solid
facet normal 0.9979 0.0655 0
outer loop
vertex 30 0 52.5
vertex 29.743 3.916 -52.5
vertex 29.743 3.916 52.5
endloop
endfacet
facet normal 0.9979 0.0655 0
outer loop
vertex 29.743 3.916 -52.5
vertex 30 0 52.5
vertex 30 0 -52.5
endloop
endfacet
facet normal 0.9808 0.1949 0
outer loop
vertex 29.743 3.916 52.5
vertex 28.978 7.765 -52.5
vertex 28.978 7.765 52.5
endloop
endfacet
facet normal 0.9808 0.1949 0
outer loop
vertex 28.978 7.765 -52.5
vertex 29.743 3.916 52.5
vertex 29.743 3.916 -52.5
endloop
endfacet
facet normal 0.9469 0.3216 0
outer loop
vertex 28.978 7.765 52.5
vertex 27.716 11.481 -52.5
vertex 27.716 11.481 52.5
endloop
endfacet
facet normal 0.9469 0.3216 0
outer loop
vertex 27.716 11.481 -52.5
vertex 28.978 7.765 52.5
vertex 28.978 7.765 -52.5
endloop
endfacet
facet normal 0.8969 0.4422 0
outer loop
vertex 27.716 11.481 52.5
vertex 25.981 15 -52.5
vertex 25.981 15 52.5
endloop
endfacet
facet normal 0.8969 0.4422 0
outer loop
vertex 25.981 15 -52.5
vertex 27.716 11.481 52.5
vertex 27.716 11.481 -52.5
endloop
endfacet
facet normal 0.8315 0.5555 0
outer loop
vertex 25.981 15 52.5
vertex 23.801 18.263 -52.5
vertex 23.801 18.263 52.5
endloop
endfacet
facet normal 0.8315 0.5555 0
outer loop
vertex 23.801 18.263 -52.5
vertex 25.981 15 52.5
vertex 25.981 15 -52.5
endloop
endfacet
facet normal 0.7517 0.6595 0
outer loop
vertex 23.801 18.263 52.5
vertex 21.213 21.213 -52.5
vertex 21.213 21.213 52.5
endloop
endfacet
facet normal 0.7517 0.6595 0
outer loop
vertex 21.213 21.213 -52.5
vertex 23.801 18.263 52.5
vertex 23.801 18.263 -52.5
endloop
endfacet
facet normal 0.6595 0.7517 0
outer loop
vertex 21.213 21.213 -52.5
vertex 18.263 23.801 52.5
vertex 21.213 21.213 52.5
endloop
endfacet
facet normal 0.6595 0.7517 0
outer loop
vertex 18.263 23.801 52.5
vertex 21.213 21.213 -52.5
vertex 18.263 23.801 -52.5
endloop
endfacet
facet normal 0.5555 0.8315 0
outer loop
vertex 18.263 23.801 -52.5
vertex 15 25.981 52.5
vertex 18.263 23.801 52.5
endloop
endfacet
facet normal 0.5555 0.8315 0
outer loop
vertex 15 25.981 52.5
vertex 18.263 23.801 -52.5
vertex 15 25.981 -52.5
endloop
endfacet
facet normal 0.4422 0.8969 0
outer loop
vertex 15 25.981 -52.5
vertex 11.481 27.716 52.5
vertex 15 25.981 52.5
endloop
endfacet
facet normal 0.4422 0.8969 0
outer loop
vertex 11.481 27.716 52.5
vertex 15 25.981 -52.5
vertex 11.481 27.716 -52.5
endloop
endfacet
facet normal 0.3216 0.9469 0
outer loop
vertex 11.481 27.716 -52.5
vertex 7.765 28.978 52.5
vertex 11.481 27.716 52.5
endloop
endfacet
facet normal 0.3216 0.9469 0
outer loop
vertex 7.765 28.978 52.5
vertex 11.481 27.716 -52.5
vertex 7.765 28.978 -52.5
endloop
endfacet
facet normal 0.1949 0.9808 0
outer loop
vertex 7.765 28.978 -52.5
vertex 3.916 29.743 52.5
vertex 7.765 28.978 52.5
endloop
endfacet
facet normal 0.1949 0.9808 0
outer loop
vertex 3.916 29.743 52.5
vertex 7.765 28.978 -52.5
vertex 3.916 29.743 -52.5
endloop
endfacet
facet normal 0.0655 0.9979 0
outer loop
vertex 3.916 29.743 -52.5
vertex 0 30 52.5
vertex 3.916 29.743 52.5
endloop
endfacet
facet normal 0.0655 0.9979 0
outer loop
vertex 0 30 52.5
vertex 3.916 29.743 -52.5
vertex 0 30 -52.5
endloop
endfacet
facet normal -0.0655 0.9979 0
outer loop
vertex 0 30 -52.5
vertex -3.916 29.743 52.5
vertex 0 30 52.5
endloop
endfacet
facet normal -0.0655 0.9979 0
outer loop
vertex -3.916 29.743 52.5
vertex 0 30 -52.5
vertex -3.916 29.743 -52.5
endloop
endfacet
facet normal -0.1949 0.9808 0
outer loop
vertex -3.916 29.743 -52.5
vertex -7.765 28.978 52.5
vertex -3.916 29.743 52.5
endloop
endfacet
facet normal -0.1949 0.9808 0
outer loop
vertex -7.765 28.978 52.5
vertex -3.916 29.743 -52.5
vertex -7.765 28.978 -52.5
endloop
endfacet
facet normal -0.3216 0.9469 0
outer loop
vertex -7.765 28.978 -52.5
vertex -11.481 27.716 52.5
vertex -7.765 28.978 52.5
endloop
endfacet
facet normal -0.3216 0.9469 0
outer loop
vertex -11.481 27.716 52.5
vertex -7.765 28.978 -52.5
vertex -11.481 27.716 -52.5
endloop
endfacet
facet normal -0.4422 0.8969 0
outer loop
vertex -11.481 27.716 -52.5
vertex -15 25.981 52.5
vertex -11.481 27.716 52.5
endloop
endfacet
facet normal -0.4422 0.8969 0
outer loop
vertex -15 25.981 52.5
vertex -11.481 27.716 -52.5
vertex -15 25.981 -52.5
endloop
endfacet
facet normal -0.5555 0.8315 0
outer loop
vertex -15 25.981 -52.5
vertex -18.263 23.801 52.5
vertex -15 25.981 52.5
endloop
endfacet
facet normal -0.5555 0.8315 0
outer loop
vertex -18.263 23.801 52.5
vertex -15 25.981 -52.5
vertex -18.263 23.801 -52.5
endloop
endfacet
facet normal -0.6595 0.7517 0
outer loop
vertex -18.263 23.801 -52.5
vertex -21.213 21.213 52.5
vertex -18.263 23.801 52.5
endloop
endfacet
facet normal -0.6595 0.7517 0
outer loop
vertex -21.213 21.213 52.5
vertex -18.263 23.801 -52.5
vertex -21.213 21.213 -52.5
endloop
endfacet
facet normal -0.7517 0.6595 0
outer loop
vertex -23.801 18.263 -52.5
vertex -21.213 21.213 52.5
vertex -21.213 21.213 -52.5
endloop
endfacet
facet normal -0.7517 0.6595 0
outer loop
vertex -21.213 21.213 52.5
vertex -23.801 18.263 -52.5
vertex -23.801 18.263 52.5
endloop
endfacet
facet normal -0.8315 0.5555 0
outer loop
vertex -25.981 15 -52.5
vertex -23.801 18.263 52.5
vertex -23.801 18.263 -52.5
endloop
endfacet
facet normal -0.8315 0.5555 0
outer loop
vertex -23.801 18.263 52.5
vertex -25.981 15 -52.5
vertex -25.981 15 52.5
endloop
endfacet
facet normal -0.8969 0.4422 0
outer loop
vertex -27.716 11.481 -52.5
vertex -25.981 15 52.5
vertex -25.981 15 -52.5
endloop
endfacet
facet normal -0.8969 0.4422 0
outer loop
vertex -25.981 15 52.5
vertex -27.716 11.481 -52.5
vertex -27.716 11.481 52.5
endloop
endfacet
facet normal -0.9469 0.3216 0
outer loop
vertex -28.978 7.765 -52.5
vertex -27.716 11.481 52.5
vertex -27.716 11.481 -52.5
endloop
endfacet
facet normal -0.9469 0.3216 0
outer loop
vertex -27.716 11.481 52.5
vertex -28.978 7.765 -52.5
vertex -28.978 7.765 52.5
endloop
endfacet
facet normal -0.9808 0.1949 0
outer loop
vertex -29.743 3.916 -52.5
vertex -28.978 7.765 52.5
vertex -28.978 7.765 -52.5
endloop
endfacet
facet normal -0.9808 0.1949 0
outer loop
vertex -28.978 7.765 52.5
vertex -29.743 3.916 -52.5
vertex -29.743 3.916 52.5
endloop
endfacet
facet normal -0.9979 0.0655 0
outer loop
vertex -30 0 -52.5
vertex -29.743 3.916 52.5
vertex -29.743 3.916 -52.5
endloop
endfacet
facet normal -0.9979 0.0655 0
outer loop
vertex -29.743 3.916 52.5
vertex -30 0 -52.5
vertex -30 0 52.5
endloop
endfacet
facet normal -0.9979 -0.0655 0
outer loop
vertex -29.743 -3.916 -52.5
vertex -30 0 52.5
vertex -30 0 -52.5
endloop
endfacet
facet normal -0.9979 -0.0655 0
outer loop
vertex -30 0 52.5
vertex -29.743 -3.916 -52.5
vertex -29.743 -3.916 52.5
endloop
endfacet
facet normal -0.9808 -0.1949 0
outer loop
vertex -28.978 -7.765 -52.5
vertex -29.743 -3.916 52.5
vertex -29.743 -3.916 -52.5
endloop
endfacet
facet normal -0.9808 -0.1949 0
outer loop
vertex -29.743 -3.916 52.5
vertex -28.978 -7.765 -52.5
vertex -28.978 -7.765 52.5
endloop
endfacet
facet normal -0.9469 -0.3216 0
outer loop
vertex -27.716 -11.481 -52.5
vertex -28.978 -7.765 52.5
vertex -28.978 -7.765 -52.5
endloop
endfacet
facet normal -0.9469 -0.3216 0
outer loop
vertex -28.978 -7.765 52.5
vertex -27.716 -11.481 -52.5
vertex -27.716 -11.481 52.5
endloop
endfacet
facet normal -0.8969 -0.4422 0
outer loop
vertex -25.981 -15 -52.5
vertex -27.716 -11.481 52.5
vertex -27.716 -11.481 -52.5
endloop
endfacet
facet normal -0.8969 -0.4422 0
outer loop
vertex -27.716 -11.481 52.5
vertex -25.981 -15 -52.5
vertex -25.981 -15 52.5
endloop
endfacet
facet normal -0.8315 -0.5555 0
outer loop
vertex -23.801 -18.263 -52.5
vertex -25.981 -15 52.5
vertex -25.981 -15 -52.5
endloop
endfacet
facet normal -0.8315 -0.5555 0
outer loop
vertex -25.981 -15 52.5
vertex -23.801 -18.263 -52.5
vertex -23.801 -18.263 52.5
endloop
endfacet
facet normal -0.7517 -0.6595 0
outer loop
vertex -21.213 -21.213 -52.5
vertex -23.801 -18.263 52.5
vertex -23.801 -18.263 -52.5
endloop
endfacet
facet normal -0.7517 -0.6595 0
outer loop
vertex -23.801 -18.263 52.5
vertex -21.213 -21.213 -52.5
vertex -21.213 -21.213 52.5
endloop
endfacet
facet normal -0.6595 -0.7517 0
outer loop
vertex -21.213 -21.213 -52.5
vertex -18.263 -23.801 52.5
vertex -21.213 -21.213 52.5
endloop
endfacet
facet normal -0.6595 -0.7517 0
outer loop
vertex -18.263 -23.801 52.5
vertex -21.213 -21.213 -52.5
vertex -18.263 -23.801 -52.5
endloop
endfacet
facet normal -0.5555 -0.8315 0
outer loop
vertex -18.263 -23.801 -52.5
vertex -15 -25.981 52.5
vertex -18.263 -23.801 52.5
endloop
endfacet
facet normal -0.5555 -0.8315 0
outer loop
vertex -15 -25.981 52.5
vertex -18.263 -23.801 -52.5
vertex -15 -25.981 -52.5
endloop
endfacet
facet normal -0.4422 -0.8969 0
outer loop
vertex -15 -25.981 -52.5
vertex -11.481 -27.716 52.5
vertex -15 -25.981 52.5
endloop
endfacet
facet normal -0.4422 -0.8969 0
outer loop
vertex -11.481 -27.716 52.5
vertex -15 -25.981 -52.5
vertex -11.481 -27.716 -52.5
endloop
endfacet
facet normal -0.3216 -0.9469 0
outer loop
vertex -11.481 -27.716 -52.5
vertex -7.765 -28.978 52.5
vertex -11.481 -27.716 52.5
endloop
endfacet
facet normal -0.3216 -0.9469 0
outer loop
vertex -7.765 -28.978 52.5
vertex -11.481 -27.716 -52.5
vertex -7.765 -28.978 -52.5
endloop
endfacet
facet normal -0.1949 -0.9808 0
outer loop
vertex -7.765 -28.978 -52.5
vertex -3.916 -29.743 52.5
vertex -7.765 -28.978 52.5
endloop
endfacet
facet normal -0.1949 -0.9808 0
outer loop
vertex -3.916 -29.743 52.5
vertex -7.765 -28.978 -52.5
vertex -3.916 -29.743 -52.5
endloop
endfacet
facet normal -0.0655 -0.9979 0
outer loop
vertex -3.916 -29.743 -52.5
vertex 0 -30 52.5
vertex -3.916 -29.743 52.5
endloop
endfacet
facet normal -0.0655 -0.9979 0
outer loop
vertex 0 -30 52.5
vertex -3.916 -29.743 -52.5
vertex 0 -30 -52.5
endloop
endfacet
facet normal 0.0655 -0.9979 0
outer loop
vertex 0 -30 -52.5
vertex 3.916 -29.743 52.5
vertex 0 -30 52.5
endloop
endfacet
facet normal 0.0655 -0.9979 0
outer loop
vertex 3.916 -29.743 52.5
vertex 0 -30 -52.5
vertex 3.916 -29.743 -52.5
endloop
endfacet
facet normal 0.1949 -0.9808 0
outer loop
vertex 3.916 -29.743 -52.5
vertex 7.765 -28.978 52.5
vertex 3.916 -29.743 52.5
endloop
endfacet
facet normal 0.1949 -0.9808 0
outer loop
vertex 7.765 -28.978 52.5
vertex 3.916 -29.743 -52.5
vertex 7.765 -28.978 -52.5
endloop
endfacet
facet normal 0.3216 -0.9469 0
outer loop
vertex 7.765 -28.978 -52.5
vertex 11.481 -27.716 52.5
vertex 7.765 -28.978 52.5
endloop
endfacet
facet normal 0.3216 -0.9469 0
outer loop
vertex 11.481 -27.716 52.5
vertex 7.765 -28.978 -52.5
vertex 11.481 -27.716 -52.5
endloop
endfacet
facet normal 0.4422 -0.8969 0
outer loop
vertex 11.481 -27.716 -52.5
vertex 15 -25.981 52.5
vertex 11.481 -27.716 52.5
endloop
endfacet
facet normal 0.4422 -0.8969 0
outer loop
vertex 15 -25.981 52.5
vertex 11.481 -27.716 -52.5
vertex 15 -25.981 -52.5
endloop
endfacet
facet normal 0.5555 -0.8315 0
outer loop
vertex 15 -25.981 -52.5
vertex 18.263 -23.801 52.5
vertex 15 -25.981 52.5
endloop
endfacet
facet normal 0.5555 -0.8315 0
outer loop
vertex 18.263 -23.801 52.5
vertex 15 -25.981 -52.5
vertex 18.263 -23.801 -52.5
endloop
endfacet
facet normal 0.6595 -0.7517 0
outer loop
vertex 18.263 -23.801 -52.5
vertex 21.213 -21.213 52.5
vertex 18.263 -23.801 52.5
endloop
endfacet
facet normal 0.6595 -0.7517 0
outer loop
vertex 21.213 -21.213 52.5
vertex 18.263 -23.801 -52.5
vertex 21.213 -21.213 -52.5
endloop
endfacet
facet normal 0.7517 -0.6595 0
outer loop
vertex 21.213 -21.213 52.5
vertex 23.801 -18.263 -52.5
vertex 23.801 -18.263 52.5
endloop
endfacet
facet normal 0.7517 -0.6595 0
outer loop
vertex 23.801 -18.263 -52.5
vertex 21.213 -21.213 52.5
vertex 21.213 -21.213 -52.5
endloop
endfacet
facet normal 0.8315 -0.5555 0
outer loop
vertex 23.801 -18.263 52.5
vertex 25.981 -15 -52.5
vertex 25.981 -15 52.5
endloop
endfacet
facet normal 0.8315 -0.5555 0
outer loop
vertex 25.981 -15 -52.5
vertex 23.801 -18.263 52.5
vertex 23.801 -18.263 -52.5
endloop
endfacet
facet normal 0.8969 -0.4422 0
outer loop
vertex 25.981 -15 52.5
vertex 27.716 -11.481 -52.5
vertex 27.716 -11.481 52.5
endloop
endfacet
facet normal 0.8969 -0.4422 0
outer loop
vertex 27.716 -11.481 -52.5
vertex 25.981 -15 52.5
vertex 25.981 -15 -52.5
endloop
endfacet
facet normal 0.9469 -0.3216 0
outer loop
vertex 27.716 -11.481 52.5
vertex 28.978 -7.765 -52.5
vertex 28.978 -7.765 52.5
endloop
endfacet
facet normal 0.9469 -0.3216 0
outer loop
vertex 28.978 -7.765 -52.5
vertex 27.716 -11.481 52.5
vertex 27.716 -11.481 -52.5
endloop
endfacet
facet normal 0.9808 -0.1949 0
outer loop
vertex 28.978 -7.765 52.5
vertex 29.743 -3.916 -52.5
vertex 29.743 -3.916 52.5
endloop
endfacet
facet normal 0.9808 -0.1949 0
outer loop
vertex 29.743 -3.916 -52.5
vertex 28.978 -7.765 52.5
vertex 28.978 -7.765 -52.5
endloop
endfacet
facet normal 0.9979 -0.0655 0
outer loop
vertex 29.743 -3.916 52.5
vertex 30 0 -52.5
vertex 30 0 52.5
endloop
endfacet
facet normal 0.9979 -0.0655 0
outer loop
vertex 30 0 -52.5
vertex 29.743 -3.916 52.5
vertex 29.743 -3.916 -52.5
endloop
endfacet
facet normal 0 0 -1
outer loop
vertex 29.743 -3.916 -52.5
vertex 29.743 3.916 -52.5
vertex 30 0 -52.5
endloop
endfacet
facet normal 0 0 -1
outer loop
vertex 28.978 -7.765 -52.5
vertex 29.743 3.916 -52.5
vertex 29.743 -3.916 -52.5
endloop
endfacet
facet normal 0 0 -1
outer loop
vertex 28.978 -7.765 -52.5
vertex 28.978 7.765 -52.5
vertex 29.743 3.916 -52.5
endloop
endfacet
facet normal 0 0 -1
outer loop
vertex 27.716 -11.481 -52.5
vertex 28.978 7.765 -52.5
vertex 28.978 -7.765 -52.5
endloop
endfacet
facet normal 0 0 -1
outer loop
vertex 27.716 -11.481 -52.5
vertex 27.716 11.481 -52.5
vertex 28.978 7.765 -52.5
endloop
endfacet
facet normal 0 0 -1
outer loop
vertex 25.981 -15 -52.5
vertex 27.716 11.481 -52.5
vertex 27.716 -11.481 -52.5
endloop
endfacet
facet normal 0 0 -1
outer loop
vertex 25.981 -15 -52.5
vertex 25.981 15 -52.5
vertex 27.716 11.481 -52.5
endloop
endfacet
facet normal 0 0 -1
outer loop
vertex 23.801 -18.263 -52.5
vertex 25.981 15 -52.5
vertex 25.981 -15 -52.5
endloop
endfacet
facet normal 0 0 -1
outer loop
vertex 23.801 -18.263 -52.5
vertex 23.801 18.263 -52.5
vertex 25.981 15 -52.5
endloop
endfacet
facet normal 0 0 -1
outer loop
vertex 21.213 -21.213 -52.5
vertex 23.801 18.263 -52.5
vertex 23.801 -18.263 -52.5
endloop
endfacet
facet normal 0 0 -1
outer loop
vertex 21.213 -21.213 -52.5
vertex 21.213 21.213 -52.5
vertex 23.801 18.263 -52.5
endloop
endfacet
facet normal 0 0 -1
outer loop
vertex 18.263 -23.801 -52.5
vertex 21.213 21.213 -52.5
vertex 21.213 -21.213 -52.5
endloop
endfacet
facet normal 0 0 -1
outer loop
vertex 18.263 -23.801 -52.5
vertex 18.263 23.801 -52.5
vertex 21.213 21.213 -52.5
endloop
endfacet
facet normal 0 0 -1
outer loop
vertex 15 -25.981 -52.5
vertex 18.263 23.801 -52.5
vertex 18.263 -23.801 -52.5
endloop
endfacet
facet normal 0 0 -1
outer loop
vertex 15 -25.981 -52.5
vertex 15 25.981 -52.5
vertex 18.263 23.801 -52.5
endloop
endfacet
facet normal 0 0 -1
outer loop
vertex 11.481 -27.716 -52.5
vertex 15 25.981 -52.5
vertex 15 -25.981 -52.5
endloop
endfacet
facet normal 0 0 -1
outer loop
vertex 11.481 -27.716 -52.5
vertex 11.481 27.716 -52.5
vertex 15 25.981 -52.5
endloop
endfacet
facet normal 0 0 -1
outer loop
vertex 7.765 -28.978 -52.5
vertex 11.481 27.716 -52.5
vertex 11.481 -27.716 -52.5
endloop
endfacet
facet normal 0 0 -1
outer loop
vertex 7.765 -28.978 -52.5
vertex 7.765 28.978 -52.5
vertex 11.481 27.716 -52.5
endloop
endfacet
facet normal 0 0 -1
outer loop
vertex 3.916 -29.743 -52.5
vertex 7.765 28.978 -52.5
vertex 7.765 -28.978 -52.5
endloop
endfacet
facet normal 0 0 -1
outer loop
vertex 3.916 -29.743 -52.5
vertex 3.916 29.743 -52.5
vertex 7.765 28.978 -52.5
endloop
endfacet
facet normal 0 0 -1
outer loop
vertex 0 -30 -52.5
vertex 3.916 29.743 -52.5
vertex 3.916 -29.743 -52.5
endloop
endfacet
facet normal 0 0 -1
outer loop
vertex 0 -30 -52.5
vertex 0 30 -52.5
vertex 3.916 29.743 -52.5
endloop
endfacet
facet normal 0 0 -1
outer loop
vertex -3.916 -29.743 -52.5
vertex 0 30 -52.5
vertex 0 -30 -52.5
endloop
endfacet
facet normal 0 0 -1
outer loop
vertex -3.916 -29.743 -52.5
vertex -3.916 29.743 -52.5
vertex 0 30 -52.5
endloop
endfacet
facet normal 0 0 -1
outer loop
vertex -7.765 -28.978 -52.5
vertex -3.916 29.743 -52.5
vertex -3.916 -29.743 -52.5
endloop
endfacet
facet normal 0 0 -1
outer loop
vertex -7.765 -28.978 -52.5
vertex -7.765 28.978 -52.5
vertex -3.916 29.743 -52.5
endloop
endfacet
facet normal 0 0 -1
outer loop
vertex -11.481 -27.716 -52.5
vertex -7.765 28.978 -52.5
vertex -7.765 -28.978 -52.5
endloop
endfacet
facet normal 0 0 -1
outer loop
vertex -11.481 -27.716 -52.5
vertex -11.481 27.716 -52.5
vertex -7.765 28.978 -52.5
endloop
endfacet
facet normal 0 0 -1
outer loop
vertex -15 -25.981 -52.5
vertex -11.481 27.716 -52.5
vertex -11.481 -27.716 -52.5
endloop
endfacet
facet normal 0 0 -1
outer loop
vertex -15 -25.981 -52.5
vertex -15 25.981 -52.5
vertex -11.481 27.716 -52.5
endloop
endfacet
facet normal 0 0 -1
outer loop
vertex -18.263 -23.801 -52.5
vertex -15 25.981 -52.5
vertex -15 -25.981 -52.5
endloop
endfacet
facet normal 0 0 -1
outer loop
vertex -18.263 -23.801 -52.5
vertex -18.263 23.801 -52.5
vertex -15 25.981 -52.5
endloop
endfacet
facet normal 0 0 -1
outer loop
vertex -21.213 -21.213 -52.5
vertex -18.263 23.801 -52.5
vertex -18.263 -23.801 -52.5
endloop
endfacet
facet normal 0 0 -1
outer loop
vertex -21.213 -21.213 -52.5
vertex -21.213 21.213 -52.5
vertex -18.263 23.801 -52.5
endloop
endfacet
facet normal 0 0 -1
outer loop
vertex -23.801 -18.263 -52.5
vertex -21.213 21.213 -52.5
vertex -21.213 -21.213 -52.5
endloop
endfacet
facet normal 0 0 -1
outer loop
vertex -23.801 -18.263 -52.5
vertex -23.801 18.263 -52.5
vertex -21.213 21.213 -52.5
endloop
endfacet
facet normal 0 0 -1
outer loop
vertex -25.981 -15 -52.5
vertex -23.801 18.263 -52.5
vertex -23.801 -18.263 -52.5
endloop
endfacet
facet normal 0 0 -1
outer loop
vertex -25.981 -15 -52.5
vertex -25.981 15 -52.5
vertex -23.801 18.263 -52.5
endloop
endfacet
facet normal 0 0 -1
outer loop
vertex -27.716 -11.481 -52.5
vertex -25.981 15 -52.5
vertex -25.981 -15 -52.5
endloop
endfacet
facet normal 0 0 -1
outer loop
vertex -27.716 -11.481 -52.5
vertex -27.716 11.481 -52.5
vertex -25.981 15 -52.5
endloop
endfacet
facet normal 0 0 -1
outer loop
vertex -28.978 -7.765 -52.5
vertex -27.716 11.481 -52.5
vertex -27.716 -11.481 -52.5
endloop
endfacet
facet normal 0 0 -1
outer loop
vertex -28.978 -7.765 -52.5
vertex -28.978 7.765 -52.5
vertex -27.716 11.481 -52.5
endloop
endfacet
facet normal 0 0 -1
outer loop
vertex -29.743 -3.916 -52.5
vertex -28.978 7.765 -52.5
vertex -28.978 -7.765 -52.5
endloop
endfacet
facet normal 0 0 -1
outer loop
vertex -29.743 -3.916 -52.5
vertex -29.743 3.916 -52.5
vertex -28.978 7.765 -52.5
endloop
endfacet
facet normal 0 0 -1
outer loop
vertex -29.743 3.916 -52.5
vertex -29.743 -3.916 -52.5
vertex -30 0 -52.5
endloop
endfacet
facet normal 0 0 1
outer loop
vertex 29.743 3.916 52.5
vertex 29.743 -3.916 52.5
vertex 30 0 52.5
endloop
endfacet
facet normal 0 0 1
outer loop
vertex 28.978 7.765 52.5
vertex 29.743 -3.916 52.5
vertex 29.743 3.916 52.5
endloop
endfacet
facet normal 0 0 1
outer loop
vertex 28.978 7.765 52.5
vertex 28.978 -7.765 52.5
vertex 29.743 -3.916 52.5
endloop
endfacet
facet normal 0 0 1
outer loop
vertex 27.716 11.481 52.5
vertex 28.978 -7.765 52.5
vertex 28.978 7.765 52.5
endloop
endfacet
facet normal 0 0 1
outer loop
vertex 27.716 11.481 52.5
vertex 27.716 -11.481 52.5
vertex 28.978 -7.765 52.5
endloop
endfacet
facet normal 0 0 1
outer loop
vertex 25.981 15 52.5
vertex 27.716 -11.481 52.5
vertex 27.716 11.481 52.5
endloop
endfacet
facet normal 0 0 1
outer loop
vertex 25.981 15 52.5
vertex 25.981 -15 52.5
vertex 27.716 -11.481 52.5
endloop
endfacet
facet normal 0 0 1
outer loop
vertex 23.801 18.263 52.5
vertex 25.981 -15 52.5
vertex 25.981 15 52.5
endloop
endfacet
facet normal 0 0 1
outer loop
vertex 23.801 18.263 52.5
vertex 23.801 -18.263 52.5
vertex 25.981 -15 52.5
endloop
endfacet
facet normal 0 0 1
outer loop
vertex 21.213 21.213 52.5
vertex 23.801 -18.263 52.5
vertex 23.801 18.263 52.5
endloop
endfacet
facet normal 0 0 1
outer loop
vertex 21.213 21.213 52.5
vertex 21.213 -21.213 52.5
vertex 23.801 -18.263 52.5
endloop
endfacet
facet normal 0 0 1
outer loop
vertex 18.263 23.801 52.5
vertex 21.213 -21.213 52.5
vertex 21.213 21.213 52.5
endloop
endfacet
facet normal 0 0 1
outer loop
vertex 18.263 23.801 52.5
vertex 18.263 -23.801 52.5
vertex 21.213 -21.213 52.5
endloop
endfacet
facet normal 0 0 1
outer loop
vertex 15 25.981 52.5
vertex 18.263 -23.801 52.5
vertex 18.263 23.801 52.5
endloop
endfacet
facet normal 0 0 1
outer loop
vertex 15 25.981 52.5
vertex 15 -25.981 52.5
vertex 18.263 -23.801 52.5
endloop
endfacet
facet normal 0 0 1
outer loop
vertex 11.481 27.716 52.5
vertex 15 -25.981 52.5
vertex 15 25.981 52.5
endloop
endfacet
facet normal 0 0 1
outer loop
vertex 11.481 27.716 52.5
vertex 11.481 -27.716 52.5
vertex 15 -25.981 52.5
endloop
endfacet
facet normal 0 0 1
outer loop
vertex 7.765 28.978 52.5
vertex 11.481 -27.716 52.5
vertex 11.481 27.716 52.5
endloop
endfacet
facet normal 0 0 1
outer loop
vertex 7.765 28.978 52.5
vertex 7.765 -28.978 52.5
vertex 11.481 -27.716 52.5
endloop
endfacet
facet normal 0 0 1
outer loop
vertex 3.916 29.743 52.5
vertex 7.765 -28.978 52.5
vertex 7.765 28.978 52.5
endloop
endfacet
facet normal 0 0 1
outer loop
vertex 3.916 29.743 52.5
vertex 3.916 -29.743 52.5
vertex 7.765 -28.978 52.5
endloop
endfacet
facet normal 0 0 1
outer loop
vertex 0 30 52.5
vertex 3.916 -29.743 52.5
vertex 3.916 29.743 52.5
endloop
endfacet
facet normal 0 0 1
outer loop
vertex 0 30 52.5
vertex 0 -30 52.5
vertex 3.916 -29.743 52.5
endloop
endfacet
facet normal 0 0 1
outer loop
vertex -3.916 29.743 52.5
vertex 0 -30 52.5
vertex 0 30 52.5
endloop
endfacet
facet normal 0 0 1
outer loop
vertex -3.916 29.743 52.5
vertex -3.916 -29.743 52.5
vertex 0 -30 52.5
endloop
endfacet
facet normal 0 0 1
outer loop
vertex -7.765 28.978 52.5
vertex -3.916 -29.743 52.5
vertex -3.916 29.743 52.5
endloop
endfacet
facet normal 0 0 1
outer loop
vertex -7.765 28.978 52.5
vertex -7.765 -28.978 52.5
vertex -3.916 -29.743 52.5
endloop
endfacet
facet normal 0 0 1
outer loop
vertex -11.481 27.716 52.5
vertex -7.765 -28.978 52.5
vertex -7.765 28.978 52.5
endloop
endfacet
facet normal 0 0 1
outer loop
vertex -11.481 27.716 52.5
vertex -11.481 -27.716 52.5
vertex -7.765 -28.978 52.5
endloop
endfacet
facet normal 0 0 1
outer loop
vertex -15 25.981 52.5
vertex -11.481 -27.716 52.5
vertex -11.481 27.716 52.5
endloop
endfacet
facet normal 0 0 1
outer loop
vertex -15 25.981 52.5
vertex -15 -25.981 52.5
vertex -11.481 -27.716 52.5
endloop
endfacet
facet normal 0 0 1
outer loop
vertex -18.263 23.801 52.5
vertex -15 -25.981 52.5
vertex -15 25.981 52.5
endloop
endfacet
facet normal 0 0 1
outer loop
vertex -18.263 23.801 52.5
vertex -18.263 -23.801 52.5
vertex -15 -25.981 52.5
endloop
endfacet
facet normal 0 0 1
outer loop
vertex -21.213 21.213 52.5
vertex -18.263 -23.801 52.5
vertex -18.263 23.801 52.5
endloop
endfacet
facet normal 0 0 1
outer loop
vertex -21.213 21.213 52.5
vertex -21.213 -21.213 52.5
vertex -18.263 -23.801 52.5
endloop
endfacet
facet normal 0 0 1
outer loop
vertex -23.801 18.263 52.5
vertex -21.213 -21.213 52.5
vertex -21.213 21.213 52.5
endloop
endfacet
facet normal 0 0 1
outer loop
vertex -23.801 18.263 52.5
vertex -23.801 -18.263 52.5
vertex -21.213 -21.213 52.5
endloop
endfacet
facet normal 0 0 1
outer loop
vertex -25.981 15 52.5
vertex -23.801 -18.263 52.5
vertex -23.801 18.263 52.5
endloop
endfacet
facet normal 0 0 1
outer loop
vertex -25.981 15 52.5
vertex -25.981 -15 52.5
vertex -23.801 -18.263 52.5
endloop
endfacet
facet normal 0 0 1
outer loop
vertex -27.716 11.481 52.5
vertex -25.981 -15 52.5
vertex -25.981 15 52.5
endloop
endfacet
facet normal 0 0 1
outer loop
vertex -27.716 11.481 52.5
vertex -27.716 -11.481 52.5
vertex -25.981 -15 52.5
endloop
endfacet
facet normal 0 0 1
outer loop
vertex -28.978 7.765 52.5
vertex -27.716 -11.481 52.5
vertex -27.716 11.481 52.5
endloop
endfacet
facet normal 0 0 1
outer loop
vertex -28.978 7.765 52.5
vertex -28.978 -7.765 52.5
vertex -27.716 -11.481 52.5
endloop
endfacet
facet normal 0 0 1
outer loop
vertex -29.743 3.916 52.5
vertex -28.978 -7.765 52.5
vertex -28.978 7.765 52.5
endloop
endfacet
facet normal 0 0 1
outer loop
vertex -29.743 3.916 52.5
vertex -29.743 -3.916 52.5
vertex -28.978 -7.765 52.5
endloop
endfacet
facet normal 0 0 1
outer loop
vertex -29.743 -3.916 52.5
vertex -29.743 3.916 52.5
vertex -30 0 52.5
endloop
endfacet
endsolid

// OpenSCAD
// ========================================
// a cylinder with radius 30 mm and height 105 mm
// NeuroCAD canonical IR; dimensions are millimetres
// ========================================
$fn = 48;

cylinder(r=30, h=105, center=true);
